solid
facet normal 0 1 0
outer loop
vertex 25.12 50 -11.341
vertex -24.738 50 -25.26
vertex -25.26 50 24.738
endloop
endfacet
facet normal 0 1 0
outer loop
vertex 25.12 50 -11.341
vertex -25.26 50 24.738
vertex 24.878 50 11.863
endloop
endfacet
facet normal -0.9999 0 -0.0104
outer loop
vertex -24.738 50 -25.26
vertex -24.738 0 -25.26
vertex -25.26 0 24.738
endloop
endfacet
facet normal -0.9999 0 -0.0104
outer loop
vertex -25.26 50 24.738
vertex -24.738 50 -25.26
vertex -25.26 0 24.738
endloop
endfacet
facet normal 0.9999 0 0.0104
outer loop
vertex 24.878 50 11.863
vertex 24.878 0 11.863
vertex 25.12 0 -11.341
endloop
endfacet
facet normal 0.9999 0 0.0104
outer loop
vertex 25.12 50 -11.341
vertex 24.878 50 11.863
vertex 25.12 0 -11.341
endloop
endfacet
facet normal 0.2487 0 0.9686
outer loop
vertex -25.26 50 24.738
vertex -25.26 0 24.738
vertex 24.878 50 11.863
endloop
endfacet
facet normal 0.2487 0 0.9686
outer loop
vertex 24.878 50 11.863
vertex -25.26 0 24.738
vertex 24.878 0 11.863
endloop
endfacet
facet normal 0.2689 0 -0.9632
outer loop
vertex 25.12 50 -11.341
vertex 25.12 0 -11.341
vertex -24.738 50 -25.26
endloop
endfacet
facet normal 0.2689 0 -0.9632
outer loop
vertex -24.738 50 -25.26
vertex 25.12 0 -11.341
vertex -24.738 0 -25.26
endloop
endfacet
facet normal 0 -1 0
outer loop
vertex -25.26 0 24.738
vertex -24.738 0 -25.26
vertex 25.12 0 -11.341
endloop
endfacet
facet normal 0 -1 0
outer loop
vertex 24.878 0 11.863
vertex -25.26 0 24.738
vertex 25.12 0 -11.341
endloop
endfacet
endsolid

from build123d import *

# Parameters (mm, degrees)
BOSS_EXTRU_1_DEPTH = 50
D_POUILLE7_ANGLE   = 15
D_POUILLE8_ANGLE   = -15


with BuildPart() as part:
    # Esquisse1 → Boss.-Extru.1 (new body)
    with BuildSketch(Plane(origin=(0, 0, 0), x_dir=(1, 0, 0), z_dir=(0, 1, 0))):
        Polygon((25.259584223, 24.737691987), (-24.737691987, 25.259584223), (-25.259584223, -24.737691987), (24.737691987, -25.259584223), align=None)
    extrude(amount=BOSS_EXTRU_1_DEPTH)

    # Dépouille7
    d_pouille7_faces = [part.faces().sort_by_distance(p)[0] for p in [
        (0.260946118, 25, -24.998638105),
        (-0.260946118, 25, 24.998638105),
    ]]
    draft(d_pouille7_faces, Plane(origin=(-24.737691987, 50, -25.259584223), x_dir=(0.010437844720406831, 0, -0.9999455242149908), z_dir=(-0.9999455242149908, 0, -0.010437844720406831)), D_POUILLE7_ANGLE)

    # Dépouille8
    d_pouille8_faces = [part.faces().sort_by_distance(p)[0] for p in [
        (0.33086642, 25, -31.697002998),
        (-0.33086642, 25, 31.697002998),
    ]]
    draft(d_pouille8_faces, Plane(origin=(-24.737691987, 50, -25.259584223), x_dir=(0.010437844720406831, 0, -0.9999455242149908), z_dir=(-0.9999455242149908, 0, -0.010437844720406831)), D_POUILLE8_ANGLE)


solid = part.part
